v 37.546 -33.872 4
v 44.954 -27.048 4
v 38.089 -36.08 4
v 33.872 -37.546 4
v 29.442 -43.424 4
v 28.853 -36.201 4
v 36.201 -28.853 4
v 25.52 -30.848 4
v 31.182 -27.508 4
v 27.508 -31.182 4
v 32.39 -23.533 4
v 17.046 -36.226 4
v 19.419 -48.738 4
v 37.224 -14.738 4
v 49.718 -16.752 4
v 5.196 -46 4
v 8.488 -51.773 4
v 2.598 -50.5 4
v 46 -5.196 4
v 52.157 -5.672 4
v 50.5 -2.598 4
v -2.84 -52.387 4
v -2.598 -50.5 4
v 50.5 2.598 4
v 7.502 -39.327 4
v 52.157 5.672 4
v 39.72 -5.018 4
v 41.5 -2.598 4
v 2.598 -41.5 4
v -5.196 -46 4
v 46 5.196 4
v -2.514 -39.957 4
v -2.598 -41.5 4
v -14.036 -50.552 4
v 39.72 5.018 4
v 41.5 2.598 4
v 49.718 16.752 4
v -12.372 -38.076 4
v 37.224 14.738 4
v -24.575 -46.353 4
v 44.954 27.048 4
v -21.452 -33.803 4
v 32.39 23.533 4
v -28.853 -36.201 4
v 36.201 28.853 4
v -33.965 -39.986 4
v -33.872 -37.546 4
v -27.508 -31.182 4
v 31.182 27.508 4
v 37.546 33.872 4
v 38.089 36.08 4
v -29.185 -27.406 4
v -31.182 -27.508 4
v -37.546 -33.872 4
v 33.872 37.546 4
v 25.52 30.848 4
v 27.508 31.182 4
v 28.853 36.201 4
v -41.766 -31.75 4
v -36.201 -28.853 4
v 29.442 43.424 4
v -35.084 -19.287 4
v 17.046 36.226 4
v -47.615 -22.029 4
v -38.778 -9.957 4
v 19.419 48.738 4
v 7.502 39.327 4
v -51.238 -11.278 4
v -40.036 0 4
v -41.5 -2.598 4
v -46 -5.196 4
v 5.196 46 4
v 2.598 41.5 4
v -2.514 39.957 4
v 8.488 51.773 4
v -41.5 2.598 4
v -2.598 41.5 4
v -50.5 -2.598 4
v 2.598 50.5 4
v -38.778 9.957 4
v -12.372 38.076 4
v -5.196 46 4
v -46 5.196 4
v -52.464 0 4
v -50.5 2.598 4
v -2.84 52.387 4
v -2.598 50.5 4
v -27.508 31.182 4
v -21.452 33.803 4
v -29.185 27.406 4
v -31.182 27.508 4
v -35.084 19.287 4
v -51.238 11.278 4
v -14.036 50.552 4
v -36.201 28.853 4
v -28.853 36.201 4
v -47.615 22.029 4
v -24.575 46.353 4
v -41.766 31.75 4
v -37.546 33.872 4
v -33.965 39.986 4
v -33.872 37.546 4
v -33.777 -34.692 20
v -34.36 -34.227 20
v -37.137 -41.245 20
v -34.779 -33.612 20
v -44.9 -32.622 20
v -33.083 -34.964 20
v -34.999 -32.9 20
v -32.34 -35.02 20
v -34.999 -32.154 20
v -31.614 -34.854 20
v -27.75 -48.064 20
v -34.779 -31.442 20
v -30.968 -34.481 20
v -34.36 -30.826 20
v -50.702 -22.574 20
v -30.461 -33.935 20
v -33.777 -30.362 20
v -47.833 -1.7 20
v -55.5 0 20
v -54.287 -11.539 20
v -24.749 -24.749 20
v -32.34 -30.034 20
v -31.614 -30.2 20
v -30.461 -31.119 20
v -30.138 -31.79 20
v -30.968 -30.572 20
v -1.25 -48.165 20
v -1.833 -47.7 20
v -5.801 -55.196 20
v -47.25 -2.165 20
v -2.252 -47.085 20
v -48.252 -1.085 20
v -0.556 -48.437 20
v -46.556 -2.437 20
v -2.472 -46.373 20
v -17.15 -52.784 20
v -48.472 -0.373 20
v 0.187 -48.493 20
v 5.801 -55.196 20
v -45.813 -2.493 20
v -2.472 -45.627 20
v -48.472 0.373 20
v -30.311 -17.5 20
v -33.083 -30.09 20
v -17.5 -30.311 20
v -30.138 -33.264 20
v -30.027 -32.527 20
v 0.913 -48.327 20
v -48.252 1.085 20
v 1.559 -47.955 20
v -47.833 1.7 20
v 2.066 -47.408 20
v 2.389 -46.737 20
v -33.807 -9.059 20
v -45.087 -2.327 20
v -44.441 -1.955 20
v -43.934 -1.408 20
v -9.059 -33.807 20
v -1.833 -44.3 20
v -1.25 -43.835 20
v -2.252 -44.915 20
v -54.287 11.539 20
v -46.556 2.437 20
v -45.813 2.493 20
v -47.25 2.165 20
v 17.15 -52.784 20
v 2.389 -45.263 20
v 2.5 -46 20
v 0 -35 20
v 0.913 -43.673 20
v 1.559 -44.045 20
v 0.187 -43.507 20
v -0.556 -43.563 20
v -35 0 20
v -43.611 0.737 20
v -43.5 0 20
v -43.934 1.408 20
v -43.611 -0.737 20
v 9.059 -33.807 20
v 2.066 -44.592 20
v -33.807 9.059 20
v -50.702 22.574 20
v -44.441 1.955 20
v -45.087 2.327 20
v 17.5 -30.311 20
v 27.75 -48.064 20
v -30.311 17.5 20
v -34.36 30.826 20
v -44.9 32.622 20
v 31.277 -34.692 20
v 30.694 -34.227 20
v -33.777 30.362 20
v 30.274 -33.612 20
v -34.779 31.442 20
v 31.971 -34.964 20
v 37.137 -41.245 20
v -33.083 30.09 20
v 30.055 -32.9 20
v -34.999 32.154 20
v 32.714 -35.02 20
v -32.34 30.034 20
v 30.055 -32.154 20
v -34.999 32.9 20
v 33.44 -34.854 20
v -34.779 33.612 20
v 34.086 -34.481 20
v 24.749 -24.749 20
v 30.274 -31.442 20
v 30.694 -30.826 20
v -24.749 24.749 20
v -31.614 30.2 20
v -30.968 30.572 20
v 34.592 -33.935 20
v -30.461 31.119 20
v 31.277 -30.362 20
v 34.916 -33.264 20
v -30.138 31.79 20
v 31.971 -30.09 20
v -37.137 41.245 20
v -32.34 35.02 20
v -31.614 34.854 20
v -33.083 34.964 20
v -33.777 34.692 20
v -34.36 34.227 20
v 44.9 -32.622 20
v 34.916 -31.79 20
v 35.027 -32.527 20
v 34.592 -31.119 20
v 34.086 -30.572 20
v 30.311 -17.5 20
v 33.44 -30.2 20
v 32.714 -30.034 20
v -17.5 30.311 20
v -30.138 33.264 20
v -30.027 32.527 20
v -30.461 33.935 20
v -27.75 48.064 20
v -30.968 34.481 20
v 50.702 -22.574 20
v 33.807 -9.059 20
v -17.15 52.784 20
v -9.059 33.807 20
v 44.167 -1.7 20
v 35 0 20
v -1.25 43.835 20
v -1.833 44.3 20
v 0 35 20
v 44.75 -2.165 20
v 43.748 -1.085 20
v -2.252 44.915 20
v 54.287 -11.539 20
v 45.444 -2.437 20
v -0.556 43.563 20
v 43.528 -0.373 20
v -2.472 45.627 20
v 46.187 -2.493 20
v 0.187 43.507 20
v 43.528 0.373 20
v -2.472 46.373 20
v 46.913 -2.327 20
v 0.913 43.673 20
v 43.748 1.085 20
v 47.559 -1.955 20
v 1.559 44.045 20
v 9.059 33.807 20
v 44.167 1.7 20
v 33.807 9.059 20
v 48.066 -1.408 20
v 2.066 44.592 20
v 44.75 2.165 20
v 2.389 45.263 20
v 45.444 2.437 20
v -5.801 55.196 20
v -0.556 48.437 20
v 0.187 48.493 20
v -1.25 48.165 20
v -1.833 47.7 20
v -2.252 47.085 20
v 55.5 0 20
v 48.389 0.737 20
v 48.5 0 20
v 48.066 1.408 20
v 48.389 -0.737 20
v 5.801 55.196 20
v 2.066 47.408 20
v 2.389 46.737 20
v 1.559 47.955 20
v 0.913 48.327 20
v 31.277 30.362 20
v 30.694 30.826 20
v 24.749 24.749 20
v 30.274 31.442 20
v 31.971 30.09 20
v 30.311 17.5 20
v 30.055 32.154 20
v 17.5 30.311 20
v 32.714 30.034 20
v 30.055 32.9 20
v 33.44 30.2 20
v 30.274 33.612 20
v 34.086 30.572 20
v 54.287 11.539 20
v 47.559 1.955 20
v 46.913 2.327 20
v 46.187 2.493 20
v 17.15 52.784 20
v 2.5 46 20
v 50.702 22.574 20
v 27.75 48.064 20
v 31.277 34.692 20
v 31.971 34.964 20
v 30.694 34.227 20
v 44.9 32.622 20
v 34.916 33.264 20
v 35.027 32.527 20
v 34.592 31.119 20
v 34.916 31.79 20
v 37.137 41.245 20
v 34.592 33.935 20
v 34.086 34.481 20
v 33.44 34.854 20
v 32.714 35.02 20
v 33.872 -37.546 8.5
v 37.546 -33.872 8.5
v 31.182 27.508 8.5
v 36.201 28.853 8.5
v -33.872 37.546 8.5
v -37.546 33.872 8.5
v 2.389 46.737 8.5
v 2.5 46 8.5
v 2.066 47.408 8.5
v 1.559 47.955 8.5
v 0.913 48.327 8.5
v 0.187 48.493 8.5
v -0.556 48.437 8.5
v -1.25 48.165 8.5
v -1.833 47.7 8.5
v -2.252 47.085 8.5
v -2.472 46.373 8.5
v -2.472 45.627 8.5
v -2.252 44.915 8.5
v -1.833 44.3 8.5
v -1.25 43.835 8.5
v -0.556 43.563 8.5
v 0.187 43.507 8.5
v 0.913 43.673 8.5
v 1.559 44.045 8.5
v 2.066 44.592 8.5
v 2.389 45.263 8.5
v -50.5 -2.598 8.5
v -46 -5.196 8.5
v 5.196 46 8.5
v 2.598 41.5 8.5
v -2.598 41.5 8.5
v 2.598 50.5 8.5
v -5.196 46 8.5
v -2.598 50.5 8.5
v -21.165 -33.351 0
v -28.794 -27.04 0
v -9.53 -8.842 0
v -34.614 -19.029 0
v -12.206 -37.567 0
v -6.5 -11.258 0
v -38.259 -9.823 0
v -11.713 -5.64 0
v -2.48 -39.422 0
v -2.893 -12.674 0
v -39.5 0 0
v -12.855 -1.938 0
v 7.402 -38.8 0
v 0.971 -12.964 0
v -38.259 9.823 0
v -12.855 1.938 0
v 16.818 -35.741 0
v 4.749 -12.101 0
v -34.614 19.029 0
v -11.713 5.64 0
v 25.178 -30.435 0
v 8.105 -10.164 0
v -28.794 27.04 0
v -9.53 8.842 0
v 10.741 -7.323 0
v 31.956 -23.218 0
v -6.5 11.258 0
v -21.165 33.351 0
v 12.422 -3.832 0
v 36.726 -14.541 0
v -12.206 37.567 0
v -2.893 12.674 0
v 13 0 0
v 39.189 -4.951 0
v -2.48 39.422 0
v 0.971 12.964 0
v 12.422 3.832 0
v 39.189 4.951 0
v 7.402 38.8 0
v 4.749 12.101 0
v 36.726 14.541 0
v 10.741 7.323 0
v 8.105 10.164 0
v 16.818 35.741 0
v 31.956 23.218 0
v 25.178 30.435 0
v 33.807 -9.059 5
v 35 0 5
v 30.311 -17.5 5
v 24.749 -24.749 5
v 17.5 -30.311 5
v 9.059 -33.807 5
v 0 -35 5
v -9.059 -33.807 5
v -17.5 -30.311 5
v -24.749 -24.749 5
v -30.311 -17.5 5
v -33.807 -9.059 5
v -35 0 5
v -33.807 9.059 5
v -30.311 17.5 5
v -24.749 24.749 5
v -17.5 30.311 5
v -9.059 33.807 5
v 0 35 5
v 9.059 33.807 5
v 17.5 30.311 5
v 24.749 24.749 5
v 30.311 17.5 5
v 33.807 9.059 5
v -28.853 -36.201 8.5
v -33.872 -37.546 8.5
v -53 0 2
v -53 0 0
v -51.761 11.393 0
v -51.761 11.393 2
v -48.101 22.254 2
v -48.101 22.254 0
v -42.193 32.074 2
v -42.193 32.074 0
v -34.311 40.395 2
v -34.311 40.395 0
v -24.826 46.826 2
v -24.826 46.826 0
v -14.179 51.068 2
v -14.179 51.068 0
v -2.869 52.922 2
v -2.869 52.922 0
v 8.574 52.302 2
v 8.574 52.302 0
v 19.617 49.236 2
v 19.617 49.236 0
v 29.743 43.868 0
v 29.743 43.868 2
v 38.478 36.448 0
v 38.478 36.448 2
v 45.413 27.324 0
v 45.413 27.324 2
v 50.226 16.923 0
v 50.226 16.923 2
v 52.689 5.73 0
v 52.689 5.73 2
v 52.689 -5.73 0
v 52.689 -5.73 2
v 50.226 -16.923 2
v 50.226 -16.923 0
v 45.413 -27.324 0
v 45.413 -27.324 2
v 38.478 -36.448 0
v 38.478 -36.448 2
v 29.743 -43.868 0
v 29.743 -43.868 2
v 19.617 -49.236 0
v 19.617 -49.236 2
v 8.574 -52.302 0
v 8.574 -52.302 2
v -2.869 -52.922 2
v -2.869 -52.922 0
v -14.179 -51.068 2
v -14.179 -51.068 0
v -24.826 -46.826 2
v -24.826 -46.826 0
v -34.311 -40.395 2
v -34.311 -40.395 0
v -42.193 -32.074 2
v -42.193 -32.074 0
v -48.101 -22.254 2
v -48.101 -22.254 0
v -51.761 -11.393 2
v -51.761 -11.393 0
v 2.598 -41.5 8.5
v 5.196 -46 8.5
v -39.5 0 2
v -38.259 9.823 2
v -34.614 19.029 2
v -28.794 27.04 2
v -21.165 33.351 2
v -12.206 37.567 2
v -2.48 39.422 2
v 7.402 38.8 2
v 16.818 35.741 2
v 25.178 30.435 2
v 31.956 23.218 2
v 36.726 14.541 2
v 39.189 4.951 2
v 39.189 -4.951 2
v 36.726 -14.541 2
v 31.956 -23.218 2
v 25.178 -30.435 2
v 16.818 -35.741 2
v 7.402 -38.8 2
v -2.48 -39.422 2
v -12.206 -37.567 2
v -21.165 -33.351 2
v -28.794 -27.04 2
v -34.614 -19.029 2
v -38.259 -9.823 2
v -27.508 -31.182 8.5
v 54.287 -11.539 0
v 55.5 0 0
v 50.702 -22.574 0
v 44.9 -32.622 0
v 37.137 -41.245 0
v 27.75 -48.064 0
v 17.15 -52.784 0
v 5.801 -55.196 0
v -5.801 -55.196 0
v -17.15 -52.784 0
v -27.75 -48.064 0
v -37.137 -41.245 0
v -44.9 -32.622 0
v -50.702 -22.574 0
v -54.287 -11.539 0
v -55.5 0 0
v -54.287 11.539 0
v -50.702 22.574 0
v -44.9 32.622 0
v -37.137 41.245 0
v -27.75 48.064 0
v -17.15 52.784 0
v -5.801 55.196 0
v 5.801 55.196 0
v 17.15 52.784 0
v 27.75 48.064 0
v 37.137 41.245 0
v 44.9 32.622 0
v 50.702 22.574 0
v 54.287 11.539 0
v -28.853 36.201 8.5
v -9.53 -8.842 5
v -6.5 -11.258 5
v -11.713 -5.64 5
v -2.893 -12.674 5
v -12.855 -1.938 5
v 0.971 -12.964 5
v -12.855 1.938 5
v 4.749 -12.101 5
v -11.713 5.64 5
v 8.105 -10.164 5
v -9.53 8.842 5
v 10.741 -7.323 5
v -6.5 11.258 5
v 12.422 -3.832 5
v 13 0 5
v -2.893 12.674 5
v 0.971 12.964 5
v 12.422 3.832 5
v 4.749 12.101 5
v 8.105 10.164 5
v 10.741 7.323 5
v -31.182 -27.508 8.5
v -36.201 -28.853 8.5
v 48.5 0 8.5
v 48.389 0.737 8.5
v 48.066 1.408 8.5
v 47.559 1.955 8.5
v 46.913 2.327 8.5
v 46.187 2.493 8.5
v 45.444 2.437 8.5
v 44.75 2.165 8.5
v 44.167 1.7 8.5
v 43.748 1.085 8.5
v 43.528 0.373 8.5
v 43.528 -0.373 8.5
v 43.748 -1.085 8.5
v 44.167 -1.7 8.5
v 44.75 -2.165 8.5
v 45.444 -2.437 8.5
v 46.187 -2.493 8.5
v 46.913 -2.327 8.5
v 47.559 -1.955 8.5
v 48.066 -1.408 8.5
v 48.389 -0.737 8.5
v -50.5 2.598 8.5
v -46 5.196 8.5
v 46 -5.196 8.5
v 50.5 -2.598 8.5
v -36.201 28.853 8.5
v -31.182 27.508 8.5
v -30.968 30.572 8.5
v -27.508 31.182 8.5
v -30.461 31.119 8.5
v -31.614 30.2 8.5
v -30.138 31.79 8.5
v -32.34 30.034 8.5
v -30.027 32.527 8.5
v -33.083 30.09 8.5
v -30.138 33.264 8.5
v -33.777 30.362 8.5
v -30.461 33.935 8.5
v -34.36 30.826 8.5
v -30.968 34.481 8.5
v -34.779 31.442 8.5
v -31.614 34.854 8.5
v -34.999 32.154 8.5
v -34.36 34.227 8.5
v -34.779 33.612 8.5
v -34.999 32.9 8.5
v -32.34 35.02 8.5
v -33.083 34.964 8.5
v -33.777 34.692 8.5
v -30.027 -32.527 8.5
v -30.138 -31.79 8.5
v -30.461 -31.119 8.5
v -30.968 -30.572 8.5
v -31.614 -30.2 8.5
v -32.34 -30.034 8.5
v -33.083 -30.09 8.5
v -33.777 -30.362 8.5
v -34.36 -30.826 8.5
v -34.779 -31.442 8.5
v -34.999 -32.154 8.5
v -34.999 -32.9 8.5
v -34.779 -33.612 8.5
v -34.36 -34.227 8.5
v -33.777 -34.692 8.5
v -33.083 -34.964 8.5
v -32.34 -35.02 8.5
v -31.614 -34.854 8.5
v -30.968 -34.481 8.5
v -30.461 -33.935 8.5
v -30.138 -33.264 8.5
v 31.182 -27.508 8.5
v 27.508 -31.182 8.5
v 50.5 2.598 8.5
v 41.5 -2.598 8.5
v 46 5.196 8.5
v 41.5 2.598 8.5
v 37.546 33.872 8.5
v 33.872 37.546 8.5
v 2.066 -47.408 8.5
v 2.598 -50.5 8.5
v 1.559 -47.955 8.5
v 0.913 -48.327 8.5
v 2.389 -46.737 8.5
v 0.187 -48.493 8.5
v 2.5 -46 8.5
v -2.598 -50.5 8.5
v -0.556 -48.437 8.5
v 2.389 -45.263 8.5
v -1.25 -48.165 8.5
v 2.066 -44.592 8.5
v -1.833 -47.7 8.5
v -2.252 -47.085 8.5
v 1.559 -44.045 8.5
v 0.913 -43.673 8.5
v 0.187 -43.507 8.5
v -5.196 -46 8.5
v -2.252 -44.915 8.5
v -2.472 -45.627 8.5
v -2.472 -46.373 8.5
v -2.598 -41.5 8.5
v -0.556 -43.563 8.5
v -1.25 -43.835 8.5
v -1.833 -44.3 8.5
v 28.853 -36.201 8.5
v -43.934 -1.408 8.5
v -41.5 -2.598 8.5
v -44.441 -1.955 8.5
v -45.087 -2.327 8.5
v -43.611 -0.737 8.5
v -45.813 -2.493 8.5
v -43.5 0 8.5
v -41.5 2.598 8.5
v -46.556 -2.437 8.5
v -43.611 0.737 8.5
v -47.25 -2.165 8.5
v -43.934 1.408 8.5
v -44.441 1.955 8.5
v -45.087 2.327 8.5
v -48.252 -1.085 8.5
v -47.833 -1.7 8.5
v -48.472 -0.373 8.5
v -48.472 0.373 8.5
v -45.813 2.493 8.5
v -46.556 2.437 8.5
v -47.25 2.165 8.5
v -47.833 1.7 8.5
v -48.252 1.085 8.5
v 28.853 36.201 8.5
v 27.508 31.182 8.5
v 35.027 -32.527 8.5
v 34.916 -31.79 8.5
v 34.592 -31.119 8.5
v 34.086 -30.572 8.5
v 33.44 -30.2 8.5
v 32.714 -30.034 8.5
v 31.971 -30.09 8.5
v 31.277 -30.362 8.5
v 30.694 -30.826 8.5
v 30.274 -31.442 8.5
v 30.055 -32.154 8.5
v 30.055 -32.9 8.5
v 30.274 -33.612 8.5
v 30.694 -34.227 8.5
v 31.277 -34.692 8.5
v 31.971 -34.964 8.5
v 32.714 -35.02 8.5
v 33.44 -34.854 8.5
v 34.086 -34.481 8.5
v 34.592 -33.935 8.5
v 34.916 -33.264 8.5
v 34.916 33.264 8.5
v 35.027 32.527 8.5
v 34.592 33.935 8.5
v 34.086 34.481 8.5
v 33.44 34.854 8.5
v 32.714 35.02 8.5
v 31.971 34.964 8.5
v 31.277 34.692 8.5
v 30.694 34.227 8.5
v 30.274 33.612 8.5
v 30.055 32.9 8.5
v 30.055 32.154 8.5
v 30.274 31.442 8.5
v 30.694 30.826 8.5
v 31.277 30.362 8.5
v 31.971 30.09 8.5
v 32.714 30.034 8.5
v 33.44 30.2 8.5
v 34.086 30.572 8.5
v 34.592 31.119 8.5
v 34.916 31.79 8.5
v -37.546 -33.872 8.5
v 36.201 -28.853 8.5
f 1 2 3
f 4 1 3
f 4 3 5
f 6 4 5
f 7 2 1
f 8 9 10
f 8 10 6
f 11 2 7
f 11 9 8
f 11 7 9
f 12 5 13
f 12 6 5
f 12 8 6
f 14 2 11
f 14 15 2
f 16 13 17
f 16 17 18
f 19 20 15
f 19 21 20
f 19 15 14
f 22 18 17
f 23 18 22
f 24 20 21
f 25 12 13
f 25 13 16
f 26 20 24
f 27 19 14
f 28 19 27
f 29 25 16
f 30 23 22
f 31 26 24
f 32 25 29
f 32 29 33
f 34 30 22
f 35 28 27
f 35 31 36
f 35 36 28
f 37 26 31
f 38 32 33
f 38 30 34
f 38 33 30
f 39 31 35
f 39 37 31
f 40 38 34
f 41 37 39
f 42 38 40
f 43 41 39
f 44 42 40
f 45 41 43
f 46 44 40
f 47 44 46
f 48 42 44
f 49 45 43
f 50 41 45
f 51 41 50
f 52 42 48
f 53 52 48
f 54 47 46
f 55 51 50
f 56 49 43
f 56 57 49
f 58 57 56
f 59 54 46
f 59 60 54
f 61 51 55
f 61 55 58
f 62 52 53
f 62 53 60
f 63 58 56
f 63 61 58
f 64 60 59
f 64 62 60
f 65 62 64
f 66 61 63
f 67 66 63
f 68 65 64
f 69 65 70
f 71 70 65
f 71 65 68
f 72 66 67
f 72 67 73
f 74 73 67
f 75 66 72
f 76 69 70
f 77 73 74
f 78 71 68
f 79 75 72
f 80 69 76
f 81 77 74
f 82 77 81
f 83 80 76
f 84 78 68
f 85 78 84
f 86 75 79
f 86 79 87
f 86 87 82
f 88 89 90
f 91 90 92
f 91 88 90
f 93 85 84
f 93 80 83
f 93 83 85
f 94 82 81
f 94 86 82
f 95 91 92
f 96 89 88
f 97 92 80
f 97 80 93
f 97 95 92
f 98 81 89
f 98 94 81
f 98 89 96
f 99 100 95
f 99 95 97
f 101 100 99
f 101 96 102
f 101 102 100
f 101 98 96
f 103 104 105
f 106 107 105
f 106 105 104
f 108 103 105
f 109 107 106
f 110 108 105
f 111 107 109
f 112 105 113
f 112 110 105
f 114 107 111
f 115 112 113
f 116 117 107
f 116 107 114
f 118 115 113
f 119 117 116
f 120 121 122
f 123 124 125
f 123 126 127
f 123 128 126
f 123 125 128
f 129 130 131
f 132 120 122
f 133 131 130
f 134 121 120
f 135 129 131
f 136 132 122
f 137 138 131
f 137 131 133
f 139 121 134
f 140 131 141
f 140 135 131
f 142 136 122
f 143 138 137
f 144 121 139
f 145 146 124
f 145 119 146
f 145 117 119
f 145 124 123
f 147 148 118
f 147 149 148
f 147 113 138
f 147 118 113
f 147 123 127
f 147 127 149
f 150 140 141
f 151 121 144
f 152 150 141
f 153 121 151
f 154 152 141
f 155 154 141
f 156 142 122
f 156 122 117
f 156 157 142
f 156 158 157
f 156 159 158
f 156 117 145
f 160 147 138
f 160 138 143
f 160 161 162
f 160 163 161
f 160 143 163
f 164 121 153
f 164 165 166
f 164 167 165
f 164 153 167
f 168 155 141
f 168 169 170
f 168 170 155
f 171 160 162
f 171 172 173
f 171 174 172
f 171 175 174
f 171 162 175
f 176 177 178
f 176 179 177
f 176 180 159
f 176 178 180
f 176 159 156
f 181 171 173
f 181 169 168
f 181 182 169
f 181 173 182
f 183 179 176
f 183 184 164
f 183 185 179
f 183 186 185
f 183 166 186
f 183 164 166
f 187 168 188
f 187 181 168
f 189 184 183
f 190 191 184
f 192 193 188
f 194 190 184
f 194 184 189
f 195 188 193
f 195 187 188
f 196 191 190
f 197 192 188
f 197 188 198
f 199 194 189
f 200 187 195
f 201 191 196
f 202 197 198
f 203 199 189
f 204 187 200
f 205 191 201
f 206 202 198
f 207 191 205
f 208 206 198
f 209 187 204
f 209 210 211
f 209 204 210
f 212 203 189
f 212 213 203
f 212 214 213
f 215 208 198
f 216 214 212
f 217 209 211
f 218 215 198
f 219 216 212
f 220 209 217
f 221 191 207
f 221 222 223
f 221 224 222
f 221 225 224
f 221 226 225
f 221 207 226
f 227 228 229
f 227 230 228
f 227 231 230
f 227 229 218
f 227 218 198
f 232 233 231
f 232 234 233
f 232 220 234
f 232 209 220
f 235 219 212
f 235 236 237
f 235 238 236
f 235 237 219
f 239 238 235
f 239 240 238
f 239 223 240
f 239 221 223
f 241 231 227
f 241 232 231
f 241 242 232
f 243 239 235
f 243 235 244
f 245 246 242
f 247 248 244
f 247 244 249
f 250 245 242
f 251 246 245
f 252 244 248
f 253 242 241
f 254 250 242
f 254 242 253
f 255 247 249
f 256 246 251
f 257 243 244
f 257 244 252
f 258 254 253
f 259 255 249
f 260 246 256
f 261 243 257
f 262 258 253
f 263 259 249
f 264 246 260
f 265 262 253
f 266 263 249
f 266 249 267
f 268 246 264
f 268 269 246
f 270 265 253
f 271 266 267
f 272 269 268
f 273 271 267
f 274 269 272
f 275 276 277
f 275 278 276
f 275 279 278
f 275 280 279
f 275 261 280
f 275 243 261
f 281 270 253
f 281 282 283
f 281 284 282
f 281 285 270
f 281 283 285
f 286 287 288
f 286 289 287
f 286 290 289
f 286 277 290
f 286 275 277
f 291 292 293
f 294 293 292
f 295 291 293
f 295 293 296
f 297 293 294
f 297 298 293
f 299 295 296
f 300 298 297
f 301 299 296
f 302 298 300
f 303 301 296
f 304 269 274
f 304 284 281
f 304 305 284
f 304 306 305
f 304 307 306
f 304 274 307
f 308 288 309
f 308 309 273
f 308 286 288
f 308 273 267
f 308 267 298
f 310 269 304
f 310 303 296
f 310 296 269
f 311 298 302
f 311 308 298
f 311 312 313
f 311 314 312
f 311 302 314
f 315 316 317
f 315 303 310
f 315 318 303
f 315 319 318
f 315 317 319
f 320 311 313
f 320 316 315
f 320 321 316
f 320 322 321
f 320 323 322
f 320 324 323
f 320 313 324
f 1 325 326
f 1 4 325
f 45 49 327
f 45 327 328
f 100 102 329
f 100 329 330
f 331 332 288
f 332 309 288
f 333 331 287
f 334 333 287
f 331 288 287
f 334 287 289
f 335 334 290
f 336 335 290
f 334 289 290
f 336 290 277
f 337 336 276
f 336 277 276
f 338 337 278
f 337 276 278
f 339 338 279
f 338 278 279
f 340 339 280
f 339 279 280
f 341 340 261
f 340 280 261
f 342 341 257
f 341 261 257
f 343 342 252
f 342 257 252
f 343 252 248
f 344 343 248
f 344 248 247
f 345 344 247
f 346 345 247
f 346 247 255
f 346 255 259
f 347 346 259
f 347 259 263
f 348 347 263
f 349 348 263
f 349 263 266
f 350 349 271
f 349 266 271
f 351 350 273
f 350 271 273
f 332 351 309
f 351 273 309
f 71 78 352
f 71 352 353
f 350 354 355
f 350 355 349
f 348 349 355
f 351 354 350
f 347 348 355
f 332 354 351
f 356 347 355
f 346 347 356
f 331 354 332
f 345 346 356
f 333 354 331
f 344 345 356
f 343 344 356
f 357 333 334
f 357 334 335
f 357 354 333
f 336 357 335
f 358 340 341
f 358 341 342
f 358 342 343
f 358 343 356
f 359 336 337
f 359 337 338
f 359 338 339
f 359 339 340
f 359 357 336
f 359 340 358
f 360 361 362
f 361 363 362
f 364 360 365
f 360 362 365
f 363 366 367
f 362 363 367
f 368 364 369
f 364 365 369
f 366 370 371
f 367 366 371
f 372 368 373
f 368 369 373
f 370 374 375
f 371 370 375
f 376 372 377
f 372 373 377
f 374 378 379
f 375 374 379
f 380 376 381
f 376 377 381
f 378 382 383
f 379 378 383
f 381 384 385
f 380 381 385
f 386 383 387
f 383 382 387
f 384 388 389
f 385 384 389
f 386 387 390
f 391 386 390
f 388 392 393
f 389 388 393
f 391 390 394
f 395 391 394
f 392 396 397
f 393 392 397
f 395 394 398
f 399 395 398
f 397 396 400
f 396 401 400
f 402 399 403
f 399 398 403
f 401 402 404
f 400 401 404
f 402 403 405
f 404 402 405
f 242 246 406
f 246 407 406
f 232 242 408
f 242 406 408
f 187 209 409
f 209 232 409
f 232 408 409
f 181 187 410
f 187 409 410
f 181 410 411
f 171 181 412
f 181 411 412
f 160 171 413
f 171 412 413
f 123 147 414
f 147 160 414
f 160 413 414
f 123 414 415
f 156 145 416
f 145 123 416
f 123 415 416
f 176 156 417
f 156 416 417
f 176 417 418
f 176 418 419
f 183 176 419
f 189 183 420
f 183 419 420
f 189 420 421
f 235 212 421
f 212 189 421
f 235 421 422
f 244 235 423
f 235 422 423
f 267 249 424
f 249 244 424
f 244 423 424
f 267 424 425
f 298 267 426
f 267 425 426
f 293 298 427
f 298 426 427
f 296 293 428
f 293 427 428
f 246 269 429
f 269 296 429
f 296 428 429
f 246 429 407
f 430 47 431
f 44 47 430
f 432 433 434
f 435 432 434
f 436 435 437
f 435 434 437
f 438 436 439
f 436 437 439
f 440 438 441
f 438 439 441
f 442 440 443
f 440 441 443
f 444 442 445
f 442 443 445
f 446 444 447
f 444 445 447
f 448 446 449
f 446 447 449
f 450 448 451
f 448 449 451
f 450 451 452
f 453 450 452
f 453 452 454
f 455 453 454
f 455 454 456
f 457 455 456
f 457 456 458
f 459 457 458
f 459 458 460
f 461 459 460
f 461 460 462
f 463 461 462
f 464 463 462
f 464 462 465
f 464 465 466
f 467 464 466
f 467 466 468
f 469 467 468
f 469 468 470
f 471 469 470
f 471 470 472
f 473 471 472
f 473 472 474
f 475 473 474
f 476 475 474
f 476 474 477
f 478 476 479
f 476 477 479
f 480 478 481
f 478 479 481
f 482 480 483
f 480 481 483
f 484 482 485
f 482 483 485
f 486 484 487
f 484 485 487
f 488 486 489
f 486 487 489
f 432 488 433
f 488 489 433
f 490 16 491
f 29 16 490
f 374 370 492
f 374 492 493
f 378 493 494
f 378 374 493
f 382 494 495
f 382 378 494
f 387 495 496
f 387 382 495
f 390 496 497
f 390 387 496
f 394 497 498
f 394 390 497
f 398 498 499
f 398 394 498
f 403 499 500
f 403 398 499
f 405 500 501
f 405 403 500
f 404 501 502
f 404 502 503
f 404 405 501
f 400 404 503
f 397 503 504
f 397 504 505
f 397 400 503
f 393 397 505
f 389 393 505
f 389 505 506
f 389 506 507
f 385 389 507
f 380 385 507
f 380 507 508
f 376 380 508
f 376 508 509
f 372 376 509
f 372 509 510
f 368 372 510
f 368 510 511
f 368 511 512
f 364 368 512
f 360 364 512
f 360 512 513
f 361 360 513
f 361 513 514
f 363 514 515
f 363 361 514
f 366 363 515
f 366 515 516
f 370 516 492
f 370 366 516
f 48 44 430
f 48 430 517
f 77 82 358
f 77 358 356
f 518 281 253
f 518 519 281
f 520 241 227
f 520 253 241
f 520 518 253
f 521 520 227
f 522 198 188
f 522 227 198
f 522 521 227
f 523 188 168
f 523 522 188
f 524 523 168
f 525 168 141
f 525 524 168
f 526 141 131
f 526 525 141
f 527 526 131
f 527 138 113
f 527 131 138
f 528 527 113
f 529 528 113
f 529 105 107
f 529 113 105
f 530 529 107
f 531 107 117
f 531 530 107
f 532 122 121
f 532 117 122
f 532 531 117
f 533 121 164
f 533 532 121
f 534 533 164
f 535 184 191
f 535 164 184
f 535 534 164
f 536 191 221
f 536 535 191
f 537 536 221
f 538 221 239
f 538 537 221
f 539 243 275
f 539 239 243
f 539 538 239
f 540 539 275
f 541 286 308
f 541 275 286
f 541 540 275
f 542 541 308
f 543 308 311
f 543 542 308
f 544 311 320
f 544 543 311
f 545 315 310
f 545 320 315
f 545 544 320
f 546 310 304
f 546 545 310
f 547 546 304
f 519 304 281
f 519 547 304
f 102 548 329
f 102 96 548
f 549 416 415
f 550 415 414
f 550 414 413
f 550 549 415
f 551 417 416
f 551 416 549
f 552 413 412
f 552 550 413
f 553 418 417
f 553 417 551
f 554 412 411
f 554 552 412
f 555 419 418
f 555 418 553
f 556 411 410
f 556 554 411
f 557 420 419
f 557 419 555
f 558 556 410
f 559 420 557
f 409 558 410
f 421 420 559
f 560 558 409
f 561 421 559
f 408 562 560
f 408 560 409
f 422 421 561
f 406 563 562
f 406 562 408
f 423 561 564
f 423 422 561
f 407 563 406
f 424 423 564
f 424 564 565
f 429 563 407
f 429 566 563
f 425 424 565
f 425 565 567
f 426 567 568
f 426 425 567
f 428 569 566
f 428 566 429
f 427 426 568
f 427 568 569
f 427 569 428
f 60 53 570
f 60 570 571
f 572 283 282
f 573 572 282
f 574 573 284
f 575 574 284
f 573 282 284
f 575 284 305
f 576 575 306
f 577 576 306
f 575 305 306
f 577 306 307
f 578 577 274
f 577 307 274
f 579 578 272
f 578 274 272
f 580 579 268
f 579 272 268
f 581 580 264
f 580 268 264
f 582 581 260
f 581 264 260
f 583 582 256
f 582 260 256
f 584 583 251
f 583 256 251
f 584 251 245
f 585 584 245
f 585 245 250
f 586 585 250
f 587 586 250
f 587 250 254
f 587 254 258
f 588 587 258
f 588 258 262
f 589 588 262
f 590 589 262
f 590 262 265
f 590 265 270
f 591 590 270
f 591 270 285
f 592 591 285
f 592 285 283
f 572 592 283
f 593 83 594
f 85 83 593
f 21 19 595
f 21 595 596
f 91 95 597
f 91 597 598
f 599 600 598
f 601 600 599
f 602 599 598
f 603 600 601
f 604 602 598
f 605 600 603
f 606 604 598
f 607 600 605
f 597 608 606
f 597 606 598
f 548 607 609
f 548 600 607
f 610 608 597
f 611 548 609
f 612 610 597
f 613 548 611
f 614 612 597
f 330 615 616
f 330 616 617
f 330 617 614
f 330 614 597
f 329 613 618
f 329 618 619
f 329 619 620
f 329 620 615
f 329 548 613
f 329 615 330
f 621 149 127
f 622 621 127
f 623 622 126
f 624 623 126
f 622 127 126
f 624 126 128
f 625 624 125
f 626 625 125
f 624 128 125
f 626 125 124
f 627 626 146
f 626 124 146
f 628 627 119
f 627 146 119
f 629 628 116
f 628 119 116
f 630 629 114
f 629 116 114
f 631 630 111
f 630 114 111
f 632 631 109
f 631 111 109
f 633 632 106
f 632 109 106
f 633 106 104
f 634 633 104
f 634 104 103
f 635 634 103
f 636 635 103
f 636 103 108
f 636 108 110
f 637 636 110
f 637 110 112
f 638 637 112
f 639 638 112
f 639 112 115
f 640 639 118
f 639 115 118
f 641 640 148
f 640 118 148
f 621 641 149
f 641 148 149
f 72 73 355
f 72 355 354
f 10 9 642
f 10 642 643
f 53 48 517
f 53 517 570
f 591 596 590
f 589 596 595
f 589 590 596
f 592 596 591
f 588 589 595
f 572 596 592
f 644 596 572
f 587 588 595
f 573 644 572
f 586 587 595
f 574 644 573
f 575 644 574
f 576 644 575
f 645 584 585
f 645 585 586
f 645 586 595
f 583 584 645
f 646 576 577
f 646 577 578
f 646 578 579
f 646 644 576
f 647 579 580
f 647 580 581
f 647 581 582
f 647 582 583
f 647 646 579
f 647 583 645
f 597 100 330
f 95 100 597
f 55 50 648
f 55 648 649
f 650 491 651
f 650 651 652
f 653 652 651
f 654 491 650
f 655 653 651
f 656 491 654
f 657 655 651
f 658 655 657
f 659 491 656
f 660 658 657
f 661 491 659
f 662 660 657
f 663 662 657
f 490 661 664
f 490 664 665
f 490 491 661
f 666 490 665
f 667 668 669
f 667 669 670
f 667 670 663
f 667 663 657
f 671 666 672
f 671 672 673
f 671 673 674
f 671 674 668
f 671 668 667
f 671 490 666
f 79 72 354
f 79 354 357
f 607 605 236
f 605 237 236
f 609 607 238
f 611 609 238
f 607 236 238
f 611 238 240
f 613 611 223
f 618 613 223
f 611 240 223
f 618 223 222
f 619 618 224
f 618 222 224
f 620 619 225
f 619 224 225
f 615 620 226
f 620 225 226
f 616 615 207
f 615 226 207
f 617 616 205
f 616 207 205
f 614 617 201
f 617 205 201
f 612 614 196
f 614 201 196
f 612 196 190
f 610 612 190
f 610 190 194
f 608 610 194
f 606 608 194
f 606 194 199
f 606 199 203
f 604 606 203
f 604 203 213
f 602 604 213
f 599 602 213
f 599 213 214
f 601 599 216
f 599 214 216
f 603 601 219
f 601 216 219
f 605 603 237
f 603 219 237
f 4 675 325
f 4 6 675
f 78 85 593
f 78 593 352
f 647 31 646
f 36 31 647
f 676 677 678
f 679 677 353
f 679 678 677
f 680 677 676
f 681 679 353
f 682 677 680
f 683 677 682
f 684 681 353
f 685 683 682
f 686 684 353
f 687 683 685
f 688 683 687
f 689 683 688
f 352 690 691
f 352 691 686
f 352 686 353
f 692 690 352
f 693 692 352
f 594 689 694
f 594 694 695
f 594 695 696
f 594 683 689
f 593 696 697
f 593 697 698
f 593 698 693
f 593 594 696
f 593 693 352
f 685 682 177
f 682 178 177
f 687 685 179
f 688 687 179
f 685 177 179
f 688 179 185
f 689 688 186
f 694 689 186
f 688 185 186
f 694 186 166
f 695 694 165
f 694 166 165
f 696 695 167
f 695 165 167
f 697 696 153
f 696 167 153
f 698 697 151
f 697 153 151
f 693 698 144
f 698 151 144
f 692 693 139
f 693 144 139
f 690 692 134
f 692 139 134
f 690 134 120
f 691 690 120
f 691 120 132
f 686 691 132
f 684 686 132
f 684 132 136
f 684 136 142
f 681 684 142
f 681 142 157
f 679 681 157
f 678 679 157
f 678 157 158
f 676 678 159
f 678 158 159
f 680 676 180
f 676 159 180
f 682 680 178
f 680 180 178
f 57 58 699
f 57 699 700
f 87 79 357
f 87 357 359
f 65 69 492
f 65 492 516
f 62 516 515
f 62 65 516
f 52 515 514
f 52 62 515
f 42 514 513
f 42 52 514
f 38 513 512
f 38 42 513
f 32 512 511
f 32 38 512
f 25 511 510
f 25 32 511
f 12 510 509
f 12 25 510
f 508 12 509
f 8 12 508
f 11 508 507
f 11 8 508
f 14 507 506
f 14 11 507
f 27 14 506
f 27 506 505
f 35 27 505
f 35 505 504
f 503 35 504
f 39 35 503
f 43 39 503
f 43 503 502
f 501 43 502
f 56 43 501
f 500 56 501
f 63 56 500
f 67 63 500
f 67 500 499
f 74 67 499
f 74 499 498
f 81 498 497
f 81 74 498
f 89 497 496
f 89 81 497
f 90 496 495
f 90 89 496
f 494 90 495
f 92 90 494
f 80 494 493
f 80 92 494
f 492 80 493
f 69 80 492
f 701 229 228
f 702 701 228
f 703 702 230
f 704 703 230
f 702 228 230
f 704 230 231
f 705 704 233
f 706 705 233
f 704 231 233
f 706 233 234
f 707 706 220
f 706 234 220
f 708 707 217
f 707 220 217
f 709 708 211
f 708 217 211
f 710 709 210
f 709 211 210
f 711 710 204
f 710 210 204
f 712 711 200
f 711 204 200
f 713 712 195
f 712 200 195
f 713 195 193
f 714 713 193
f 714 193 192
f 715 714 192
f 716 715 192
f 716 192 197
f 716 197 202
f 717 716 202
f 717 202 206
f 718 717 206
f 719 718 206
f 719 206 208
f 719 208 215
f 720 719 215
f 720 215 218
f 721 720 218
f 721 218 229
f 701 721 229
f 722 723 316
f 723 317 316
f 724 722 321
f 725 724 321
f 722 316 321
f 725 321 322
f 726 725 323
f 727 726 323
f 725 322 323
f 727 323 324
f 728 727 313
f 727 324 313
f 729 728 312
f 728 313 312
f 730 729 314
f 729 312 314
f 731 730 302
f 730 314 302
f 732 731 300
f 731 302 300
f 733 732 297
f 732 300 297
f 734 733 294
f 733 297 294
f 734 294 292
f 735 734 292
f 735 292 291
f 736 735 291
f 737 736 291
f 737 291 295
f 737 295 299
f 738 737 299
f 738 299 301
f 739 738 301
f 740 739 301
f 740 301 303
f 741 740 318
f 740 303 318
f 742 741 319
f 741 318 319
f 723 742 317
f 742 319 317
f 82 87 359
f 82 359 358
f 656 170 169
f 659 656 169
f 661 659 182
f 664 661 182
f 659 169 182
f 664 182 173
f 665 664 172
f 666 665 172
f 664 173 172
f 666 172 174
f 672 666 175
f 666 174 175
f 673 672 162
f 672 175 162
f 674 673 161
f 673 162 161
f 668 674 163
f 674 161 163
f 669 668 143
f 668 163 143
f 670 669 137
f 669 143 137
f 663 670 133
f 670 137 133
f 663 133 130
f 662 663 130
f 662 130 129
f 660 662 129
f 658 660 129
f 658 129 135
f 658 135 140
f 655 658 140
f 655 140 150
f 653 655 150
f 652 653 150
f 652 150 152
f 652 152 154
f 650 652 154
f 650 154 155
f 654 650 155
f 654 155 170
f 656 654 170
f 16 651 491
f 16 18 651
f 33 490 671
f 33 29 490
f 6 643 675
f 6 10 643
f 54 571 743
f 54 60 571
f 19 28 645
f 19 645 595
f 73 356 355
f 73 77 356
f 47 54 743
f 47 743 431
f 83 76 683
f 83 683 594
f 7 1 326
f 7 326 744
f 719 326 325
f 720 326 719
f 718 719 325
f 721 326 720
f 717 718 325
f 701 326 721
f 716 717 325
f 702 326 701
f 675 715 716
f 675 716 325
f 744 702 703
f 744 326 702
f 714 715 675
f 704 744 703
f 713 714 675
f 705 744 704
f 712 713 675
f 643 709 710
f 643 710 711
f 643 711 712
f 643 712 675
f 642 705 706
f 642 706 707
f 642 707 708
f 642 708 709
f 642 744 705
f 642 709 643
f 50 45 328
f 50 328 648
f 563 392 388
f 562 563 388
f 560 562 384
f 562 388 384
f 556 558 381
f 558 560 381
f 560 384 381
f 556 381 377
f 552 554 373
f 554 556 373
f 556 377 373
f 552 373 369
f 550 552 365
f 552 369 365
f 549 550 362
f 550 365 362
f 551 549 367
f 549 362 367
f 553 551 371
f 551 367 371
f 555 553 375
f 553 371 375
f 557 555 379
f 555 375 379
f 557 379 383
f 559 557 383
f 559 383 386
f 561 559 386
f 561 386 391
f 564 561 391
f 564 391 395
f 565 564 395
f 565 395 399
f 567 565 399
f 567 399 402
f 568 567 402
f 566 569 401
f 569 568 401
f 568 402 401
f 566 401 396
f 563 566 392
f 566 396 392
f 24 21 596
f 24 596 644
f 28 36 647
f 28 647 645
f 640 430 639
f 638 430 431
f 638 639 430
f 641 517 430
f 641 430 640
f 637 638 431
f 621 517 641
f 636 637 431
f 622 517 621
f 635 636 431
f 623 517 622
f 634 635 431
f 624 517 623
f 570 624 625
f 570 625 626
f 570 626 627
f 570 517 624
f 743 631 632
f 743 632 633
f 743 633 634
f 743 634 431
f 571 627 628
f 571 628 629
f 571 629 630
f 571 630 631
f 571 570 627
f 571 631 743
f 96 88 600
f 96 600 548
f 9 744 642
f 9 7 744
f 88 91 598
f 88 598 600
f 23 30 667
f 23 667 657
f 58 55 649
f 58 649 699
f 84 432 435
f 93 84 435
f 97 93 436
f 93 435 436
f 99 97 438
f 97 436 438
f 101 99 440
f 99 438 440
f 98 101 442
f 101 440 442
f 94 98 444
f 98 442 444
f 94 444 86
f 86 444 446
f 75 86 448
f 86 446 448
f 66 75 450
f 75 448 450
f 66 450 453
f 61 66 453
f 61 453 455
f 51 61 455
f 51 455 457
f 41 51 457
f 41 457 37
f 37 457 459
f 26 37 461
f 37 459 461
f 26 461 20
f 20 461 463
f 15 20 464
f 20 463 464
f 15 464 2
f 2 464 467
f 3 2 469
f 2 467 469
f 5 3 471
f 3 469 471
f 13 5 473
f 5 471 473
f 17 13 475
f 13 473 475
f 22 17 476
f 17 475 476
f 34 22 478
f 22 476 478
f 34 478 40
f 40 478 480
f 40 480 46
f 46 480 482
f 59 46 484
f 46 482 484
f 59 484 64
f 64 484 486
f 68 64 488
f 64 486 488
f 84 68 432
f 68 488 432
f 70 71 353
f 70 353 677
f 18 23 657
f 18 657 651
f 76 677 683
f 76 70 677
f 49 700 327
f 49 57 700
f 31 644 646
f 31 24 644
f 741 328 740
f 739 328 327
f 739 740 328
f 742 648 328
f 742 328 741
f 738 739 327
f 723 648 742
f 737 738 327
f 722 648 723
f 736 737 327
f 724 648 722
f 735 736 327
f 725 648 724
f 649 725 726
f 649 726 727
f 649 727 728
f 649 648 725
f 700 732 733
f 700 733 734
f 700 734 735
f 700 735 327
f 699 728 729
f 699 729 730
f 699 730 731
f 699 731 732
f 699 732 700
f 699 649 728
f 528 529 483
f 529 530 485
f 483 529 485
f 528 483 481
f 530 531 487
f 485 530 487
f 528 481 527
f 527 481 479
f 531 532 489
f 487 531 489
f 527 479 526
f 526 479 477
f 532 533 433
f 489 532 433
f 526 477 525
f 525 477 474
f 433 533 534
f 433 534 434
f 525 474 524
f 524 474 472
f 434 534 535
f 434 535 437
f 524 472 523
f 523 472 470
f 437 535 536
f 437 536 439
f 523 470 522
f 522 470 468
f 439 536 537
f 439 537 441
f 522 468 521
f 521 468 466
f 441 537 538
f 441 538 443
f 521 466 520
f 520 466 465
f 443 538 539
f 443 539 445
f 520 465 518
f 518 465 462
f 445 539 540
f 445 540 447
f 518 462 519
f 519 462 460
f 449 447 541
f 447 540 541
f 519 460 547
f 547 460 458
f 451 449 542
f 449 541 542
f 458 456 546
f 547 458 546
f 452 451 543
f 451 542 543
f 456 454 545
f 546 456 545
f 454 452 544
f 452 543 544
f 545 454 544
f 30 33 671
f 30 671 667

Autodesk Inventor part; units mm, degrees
ref_plane "YZ Plane" through (0, 0, 0) normal (1, 0, 0) x (0, 1, 0)
ref_plane "XZ Plane" through (0, 0, 0) normal (0, 1, 0) x (-1, 0, 0)
ref_plane "XY Plane" through (0, 0, 0) normal (0, 0, 1) x (1, 0, 0)
sketch "Sketch1" plane through (0, 0, 0) normal (0, 0, 1) x (1, 0, 0)
  circle A0 centre (0, 0) radius 13
  circle A1 centre (0, 0) radius 55.5
  dimension "d0" = 26
  dimension "d1" = 111
extrude "Extrusion1" add sketch "Sketch1" along normal blind 5
sketch "Sketch2" plane through (0, 0, 5) normal (0, 0, 1) x (1, 0, 0)
  circle A0 centre (0, 0) radius 35
  circle A1 centre (0, 0) radius 55.5 projected
  dimension "d4" = 70
extrude "Extrusion2" add sketch "Sketch2" along normal blind 15
sketch "Sketch3" plane through (0, 0, 0) normal (0, 0, -1) x (-1, 0, 0)
  circle A0 centre (0, 0) radius 39.5
  circle A1 centre (0, 0) radius 53
  dimension "d7" = 79
  dimension "d8" = 106
extrude "Extrusion3" cut sketch "Sketch3" against normal blind 4
chamfer "Chamfer1" distance 2 angle 15 1 edges at (39.5, 0, 4) measured on face at (-39.3895, -2.9518, 2.6667)
chamfer "Chamfer2" distance 2 angle 15 1 edges at (53, 0, 4) measured on face at (37.1782, -37.7728, 2.6667)
sketch "Sketch5" plane through (0, 0, 20) normal (0, 0, 1) x (1, 0, 0)
  circle A0 centre (-46, 0) radius 2.5
  circle A1 centre (-32.5269, -32.5269) radius 2.5
  circle A2 centre (0, -46) radius 2.5
  circle A3 centre (32.5269, -32.5269) radius 2.5
  circle A4 centre (46, 0) radius 2.5
  circle A5 centre (32.5269, 32.5269) radius 2.5
  circle A6 centre (0, 46) radius 2.5
  circle A7 centre (-32.5269, 32.5269) radius 2.5
  point P0 (0, 0)
  dimension "d17" = 5
  dimension "d18" = 46
  dimension "d21" = 360
extrude "Extrusion4" cut sketch "Sketch5" against normal through all
sketch "Sketch6" plane through (0, 0, 4) normal (0, 0, -1) x (-1, 0, 0)
  circle A0 centre (-46, 0) radius 2.5 projected
  line L0 (-46, -5.1962) -> (-50.5, -2.5981)
  line L1 (-50.5, -2.5981) -> (-50.5, 2.5981)
  line L2 (-50.5, 2.5981) -> (-46, 5.1962)
  line L3 (-46, 5.1962) -> (-41.5, 2.5981)
  line L4 (-41.5, 2.5981) -> (-41.5, -2.5981)
  line L5 (-41.5, -2.5981) -> (-46, -5.1962)
  line L6 (-28.8527, -36.2011) -> (-33.8718, -37.546)
  line L7 (-33.8718, -37.546) -> (-37.546, -33.8718)
  line L8 (-37.546, -33.8718) -> (-36.2011, -28.8527)
  line L9 (-36.2011, -28.8527) -> (-31.182, -27.5078)
  line L10 (-31.182, -27.5078) -> (-27.5078, -31.182)
  line L11 (-27.5078, -31.182) -> (-28.8527, -36.2011)
  line L12 (5.1962, -46) -> (2.5981, -50.5)
  line L13 (2.5981, -50.5) -> (-2.5981, -50.5)
  line L14 (-2.5981, -50.5) -> (-5.1962, -46)
  line L15 (-5.1962, -46) -> (-2.5981, -41.5)
  line L16 (-2.5981, -41.5) -> (2.5981, -41.5)
  line L17 (2.5981, -41.5) -> (5.1962, -46)
  line L18 (36.2011, -28.8527) -> (37.546, -33.8718)
  line L19 (37.546, -33.8718) -> (33.8718, -37.546)
  line L20 (33.8718, -37.546) -> (28.8527, -36.2011)
  line L21 (28.8527, -36.2011) -> (27.5078, -31.182)
  line L22 (27.5078, -31.182) -> (31.182, -27.5078)
  line L23 (31.182, -27.5078) -> (36.2011, -28.8527)
  line L24 (46, 5.1962) -> (50.5, 2.5981)
  line L25 (50.5, 2.5981) -> (50.5, -2.5981)
  line L26 (50.5, -2.5981) -> (46, -5.1962)
  line L27 (46, -5.1962) -> (41.5, -2.5981)
  line L28 (41.5, -2.5981) -> (41.5, 2.5981)
  line L29 (41.5, 2.5981) -> (46, 5.1962)
  line L30 (28.8527, 36.2011) -> (33.8718, 37.546)
  line L31 (33.8718, 37.546) -> (37.546, 33.8718)
  line L32 (37.546, 33.8718) -> (36.2011, 28.8527)
  line L33 (36.2011, 28.8527) -> (31.182, 27.5078)
  line L34 (31.182, 27.5078) -> (27.5078, 31.182)
  line L35 (27.5078, 31.182) -> (28.8527, 36.2011)
  line L36 (-5.1962, 46) -> (-2.5981, 50.5)
  line L37 (-2.5981, 50.5) -> (2.5981, 50.5)
  line L38 (2.5981, 50.5) -> (5.1962, 46)
  line L39 (5.1962, 46) -> (2.5981, 41.5)
  line L40 (2.5981, 41.5) -> (-2.5981, 41.5)
  line L41 (-2.5981, 41.5) -> (-5.1962, 46)
  line L42 (-36.2011, 28.8527) -> (-37.546, 33.8718)
  line L43 (-37.546, 33.8718) -> (-33.8718, 37.546)
  line L44 (-33.8718, 37.546) -> (-28.8527, 36.2011)
  line L45 (-28.8527, 36.2011) -> (-27.5078, 31.182)
  line L46 (-27.5078, 31.182) -> (-31.182, 27.5078)
  line L47 (-31.182, 27.5078) -> (-36.2011, 28.8527)
  point P0 (0, 0)
  point P1 (-32.5269, -32.5269)
  point P2 (0, -46)
  point P3 (32.5269, -32.5269)
  point P4 (46, 0)
  point P5 (32.5269, 32.5269)
  point P6 (0, 46)
  point P7 (-32.5269, 32.5269)
  dimension "d25" = 9
  dimension "d28" = 360
extrude "Extrusion5" cut sketch "Sketch6" against normal blind 4.5 contours A0 | L0 L1 L2 L3 L4 L5 | L6 L7 L8 L9 L10 L11 | L12 L13 L14 L15 L16 L17 | L18 L19 L20 L21 L22 L23 | L24 L25 L26 L27 L28 L29 | L30 L31 L32 L33 L34 L35 | L36 L37 L38 L39 L40 L41 | L42 L43 L44 L45 L46 L47
properties part number "CS02" material "ABS Plastic"
